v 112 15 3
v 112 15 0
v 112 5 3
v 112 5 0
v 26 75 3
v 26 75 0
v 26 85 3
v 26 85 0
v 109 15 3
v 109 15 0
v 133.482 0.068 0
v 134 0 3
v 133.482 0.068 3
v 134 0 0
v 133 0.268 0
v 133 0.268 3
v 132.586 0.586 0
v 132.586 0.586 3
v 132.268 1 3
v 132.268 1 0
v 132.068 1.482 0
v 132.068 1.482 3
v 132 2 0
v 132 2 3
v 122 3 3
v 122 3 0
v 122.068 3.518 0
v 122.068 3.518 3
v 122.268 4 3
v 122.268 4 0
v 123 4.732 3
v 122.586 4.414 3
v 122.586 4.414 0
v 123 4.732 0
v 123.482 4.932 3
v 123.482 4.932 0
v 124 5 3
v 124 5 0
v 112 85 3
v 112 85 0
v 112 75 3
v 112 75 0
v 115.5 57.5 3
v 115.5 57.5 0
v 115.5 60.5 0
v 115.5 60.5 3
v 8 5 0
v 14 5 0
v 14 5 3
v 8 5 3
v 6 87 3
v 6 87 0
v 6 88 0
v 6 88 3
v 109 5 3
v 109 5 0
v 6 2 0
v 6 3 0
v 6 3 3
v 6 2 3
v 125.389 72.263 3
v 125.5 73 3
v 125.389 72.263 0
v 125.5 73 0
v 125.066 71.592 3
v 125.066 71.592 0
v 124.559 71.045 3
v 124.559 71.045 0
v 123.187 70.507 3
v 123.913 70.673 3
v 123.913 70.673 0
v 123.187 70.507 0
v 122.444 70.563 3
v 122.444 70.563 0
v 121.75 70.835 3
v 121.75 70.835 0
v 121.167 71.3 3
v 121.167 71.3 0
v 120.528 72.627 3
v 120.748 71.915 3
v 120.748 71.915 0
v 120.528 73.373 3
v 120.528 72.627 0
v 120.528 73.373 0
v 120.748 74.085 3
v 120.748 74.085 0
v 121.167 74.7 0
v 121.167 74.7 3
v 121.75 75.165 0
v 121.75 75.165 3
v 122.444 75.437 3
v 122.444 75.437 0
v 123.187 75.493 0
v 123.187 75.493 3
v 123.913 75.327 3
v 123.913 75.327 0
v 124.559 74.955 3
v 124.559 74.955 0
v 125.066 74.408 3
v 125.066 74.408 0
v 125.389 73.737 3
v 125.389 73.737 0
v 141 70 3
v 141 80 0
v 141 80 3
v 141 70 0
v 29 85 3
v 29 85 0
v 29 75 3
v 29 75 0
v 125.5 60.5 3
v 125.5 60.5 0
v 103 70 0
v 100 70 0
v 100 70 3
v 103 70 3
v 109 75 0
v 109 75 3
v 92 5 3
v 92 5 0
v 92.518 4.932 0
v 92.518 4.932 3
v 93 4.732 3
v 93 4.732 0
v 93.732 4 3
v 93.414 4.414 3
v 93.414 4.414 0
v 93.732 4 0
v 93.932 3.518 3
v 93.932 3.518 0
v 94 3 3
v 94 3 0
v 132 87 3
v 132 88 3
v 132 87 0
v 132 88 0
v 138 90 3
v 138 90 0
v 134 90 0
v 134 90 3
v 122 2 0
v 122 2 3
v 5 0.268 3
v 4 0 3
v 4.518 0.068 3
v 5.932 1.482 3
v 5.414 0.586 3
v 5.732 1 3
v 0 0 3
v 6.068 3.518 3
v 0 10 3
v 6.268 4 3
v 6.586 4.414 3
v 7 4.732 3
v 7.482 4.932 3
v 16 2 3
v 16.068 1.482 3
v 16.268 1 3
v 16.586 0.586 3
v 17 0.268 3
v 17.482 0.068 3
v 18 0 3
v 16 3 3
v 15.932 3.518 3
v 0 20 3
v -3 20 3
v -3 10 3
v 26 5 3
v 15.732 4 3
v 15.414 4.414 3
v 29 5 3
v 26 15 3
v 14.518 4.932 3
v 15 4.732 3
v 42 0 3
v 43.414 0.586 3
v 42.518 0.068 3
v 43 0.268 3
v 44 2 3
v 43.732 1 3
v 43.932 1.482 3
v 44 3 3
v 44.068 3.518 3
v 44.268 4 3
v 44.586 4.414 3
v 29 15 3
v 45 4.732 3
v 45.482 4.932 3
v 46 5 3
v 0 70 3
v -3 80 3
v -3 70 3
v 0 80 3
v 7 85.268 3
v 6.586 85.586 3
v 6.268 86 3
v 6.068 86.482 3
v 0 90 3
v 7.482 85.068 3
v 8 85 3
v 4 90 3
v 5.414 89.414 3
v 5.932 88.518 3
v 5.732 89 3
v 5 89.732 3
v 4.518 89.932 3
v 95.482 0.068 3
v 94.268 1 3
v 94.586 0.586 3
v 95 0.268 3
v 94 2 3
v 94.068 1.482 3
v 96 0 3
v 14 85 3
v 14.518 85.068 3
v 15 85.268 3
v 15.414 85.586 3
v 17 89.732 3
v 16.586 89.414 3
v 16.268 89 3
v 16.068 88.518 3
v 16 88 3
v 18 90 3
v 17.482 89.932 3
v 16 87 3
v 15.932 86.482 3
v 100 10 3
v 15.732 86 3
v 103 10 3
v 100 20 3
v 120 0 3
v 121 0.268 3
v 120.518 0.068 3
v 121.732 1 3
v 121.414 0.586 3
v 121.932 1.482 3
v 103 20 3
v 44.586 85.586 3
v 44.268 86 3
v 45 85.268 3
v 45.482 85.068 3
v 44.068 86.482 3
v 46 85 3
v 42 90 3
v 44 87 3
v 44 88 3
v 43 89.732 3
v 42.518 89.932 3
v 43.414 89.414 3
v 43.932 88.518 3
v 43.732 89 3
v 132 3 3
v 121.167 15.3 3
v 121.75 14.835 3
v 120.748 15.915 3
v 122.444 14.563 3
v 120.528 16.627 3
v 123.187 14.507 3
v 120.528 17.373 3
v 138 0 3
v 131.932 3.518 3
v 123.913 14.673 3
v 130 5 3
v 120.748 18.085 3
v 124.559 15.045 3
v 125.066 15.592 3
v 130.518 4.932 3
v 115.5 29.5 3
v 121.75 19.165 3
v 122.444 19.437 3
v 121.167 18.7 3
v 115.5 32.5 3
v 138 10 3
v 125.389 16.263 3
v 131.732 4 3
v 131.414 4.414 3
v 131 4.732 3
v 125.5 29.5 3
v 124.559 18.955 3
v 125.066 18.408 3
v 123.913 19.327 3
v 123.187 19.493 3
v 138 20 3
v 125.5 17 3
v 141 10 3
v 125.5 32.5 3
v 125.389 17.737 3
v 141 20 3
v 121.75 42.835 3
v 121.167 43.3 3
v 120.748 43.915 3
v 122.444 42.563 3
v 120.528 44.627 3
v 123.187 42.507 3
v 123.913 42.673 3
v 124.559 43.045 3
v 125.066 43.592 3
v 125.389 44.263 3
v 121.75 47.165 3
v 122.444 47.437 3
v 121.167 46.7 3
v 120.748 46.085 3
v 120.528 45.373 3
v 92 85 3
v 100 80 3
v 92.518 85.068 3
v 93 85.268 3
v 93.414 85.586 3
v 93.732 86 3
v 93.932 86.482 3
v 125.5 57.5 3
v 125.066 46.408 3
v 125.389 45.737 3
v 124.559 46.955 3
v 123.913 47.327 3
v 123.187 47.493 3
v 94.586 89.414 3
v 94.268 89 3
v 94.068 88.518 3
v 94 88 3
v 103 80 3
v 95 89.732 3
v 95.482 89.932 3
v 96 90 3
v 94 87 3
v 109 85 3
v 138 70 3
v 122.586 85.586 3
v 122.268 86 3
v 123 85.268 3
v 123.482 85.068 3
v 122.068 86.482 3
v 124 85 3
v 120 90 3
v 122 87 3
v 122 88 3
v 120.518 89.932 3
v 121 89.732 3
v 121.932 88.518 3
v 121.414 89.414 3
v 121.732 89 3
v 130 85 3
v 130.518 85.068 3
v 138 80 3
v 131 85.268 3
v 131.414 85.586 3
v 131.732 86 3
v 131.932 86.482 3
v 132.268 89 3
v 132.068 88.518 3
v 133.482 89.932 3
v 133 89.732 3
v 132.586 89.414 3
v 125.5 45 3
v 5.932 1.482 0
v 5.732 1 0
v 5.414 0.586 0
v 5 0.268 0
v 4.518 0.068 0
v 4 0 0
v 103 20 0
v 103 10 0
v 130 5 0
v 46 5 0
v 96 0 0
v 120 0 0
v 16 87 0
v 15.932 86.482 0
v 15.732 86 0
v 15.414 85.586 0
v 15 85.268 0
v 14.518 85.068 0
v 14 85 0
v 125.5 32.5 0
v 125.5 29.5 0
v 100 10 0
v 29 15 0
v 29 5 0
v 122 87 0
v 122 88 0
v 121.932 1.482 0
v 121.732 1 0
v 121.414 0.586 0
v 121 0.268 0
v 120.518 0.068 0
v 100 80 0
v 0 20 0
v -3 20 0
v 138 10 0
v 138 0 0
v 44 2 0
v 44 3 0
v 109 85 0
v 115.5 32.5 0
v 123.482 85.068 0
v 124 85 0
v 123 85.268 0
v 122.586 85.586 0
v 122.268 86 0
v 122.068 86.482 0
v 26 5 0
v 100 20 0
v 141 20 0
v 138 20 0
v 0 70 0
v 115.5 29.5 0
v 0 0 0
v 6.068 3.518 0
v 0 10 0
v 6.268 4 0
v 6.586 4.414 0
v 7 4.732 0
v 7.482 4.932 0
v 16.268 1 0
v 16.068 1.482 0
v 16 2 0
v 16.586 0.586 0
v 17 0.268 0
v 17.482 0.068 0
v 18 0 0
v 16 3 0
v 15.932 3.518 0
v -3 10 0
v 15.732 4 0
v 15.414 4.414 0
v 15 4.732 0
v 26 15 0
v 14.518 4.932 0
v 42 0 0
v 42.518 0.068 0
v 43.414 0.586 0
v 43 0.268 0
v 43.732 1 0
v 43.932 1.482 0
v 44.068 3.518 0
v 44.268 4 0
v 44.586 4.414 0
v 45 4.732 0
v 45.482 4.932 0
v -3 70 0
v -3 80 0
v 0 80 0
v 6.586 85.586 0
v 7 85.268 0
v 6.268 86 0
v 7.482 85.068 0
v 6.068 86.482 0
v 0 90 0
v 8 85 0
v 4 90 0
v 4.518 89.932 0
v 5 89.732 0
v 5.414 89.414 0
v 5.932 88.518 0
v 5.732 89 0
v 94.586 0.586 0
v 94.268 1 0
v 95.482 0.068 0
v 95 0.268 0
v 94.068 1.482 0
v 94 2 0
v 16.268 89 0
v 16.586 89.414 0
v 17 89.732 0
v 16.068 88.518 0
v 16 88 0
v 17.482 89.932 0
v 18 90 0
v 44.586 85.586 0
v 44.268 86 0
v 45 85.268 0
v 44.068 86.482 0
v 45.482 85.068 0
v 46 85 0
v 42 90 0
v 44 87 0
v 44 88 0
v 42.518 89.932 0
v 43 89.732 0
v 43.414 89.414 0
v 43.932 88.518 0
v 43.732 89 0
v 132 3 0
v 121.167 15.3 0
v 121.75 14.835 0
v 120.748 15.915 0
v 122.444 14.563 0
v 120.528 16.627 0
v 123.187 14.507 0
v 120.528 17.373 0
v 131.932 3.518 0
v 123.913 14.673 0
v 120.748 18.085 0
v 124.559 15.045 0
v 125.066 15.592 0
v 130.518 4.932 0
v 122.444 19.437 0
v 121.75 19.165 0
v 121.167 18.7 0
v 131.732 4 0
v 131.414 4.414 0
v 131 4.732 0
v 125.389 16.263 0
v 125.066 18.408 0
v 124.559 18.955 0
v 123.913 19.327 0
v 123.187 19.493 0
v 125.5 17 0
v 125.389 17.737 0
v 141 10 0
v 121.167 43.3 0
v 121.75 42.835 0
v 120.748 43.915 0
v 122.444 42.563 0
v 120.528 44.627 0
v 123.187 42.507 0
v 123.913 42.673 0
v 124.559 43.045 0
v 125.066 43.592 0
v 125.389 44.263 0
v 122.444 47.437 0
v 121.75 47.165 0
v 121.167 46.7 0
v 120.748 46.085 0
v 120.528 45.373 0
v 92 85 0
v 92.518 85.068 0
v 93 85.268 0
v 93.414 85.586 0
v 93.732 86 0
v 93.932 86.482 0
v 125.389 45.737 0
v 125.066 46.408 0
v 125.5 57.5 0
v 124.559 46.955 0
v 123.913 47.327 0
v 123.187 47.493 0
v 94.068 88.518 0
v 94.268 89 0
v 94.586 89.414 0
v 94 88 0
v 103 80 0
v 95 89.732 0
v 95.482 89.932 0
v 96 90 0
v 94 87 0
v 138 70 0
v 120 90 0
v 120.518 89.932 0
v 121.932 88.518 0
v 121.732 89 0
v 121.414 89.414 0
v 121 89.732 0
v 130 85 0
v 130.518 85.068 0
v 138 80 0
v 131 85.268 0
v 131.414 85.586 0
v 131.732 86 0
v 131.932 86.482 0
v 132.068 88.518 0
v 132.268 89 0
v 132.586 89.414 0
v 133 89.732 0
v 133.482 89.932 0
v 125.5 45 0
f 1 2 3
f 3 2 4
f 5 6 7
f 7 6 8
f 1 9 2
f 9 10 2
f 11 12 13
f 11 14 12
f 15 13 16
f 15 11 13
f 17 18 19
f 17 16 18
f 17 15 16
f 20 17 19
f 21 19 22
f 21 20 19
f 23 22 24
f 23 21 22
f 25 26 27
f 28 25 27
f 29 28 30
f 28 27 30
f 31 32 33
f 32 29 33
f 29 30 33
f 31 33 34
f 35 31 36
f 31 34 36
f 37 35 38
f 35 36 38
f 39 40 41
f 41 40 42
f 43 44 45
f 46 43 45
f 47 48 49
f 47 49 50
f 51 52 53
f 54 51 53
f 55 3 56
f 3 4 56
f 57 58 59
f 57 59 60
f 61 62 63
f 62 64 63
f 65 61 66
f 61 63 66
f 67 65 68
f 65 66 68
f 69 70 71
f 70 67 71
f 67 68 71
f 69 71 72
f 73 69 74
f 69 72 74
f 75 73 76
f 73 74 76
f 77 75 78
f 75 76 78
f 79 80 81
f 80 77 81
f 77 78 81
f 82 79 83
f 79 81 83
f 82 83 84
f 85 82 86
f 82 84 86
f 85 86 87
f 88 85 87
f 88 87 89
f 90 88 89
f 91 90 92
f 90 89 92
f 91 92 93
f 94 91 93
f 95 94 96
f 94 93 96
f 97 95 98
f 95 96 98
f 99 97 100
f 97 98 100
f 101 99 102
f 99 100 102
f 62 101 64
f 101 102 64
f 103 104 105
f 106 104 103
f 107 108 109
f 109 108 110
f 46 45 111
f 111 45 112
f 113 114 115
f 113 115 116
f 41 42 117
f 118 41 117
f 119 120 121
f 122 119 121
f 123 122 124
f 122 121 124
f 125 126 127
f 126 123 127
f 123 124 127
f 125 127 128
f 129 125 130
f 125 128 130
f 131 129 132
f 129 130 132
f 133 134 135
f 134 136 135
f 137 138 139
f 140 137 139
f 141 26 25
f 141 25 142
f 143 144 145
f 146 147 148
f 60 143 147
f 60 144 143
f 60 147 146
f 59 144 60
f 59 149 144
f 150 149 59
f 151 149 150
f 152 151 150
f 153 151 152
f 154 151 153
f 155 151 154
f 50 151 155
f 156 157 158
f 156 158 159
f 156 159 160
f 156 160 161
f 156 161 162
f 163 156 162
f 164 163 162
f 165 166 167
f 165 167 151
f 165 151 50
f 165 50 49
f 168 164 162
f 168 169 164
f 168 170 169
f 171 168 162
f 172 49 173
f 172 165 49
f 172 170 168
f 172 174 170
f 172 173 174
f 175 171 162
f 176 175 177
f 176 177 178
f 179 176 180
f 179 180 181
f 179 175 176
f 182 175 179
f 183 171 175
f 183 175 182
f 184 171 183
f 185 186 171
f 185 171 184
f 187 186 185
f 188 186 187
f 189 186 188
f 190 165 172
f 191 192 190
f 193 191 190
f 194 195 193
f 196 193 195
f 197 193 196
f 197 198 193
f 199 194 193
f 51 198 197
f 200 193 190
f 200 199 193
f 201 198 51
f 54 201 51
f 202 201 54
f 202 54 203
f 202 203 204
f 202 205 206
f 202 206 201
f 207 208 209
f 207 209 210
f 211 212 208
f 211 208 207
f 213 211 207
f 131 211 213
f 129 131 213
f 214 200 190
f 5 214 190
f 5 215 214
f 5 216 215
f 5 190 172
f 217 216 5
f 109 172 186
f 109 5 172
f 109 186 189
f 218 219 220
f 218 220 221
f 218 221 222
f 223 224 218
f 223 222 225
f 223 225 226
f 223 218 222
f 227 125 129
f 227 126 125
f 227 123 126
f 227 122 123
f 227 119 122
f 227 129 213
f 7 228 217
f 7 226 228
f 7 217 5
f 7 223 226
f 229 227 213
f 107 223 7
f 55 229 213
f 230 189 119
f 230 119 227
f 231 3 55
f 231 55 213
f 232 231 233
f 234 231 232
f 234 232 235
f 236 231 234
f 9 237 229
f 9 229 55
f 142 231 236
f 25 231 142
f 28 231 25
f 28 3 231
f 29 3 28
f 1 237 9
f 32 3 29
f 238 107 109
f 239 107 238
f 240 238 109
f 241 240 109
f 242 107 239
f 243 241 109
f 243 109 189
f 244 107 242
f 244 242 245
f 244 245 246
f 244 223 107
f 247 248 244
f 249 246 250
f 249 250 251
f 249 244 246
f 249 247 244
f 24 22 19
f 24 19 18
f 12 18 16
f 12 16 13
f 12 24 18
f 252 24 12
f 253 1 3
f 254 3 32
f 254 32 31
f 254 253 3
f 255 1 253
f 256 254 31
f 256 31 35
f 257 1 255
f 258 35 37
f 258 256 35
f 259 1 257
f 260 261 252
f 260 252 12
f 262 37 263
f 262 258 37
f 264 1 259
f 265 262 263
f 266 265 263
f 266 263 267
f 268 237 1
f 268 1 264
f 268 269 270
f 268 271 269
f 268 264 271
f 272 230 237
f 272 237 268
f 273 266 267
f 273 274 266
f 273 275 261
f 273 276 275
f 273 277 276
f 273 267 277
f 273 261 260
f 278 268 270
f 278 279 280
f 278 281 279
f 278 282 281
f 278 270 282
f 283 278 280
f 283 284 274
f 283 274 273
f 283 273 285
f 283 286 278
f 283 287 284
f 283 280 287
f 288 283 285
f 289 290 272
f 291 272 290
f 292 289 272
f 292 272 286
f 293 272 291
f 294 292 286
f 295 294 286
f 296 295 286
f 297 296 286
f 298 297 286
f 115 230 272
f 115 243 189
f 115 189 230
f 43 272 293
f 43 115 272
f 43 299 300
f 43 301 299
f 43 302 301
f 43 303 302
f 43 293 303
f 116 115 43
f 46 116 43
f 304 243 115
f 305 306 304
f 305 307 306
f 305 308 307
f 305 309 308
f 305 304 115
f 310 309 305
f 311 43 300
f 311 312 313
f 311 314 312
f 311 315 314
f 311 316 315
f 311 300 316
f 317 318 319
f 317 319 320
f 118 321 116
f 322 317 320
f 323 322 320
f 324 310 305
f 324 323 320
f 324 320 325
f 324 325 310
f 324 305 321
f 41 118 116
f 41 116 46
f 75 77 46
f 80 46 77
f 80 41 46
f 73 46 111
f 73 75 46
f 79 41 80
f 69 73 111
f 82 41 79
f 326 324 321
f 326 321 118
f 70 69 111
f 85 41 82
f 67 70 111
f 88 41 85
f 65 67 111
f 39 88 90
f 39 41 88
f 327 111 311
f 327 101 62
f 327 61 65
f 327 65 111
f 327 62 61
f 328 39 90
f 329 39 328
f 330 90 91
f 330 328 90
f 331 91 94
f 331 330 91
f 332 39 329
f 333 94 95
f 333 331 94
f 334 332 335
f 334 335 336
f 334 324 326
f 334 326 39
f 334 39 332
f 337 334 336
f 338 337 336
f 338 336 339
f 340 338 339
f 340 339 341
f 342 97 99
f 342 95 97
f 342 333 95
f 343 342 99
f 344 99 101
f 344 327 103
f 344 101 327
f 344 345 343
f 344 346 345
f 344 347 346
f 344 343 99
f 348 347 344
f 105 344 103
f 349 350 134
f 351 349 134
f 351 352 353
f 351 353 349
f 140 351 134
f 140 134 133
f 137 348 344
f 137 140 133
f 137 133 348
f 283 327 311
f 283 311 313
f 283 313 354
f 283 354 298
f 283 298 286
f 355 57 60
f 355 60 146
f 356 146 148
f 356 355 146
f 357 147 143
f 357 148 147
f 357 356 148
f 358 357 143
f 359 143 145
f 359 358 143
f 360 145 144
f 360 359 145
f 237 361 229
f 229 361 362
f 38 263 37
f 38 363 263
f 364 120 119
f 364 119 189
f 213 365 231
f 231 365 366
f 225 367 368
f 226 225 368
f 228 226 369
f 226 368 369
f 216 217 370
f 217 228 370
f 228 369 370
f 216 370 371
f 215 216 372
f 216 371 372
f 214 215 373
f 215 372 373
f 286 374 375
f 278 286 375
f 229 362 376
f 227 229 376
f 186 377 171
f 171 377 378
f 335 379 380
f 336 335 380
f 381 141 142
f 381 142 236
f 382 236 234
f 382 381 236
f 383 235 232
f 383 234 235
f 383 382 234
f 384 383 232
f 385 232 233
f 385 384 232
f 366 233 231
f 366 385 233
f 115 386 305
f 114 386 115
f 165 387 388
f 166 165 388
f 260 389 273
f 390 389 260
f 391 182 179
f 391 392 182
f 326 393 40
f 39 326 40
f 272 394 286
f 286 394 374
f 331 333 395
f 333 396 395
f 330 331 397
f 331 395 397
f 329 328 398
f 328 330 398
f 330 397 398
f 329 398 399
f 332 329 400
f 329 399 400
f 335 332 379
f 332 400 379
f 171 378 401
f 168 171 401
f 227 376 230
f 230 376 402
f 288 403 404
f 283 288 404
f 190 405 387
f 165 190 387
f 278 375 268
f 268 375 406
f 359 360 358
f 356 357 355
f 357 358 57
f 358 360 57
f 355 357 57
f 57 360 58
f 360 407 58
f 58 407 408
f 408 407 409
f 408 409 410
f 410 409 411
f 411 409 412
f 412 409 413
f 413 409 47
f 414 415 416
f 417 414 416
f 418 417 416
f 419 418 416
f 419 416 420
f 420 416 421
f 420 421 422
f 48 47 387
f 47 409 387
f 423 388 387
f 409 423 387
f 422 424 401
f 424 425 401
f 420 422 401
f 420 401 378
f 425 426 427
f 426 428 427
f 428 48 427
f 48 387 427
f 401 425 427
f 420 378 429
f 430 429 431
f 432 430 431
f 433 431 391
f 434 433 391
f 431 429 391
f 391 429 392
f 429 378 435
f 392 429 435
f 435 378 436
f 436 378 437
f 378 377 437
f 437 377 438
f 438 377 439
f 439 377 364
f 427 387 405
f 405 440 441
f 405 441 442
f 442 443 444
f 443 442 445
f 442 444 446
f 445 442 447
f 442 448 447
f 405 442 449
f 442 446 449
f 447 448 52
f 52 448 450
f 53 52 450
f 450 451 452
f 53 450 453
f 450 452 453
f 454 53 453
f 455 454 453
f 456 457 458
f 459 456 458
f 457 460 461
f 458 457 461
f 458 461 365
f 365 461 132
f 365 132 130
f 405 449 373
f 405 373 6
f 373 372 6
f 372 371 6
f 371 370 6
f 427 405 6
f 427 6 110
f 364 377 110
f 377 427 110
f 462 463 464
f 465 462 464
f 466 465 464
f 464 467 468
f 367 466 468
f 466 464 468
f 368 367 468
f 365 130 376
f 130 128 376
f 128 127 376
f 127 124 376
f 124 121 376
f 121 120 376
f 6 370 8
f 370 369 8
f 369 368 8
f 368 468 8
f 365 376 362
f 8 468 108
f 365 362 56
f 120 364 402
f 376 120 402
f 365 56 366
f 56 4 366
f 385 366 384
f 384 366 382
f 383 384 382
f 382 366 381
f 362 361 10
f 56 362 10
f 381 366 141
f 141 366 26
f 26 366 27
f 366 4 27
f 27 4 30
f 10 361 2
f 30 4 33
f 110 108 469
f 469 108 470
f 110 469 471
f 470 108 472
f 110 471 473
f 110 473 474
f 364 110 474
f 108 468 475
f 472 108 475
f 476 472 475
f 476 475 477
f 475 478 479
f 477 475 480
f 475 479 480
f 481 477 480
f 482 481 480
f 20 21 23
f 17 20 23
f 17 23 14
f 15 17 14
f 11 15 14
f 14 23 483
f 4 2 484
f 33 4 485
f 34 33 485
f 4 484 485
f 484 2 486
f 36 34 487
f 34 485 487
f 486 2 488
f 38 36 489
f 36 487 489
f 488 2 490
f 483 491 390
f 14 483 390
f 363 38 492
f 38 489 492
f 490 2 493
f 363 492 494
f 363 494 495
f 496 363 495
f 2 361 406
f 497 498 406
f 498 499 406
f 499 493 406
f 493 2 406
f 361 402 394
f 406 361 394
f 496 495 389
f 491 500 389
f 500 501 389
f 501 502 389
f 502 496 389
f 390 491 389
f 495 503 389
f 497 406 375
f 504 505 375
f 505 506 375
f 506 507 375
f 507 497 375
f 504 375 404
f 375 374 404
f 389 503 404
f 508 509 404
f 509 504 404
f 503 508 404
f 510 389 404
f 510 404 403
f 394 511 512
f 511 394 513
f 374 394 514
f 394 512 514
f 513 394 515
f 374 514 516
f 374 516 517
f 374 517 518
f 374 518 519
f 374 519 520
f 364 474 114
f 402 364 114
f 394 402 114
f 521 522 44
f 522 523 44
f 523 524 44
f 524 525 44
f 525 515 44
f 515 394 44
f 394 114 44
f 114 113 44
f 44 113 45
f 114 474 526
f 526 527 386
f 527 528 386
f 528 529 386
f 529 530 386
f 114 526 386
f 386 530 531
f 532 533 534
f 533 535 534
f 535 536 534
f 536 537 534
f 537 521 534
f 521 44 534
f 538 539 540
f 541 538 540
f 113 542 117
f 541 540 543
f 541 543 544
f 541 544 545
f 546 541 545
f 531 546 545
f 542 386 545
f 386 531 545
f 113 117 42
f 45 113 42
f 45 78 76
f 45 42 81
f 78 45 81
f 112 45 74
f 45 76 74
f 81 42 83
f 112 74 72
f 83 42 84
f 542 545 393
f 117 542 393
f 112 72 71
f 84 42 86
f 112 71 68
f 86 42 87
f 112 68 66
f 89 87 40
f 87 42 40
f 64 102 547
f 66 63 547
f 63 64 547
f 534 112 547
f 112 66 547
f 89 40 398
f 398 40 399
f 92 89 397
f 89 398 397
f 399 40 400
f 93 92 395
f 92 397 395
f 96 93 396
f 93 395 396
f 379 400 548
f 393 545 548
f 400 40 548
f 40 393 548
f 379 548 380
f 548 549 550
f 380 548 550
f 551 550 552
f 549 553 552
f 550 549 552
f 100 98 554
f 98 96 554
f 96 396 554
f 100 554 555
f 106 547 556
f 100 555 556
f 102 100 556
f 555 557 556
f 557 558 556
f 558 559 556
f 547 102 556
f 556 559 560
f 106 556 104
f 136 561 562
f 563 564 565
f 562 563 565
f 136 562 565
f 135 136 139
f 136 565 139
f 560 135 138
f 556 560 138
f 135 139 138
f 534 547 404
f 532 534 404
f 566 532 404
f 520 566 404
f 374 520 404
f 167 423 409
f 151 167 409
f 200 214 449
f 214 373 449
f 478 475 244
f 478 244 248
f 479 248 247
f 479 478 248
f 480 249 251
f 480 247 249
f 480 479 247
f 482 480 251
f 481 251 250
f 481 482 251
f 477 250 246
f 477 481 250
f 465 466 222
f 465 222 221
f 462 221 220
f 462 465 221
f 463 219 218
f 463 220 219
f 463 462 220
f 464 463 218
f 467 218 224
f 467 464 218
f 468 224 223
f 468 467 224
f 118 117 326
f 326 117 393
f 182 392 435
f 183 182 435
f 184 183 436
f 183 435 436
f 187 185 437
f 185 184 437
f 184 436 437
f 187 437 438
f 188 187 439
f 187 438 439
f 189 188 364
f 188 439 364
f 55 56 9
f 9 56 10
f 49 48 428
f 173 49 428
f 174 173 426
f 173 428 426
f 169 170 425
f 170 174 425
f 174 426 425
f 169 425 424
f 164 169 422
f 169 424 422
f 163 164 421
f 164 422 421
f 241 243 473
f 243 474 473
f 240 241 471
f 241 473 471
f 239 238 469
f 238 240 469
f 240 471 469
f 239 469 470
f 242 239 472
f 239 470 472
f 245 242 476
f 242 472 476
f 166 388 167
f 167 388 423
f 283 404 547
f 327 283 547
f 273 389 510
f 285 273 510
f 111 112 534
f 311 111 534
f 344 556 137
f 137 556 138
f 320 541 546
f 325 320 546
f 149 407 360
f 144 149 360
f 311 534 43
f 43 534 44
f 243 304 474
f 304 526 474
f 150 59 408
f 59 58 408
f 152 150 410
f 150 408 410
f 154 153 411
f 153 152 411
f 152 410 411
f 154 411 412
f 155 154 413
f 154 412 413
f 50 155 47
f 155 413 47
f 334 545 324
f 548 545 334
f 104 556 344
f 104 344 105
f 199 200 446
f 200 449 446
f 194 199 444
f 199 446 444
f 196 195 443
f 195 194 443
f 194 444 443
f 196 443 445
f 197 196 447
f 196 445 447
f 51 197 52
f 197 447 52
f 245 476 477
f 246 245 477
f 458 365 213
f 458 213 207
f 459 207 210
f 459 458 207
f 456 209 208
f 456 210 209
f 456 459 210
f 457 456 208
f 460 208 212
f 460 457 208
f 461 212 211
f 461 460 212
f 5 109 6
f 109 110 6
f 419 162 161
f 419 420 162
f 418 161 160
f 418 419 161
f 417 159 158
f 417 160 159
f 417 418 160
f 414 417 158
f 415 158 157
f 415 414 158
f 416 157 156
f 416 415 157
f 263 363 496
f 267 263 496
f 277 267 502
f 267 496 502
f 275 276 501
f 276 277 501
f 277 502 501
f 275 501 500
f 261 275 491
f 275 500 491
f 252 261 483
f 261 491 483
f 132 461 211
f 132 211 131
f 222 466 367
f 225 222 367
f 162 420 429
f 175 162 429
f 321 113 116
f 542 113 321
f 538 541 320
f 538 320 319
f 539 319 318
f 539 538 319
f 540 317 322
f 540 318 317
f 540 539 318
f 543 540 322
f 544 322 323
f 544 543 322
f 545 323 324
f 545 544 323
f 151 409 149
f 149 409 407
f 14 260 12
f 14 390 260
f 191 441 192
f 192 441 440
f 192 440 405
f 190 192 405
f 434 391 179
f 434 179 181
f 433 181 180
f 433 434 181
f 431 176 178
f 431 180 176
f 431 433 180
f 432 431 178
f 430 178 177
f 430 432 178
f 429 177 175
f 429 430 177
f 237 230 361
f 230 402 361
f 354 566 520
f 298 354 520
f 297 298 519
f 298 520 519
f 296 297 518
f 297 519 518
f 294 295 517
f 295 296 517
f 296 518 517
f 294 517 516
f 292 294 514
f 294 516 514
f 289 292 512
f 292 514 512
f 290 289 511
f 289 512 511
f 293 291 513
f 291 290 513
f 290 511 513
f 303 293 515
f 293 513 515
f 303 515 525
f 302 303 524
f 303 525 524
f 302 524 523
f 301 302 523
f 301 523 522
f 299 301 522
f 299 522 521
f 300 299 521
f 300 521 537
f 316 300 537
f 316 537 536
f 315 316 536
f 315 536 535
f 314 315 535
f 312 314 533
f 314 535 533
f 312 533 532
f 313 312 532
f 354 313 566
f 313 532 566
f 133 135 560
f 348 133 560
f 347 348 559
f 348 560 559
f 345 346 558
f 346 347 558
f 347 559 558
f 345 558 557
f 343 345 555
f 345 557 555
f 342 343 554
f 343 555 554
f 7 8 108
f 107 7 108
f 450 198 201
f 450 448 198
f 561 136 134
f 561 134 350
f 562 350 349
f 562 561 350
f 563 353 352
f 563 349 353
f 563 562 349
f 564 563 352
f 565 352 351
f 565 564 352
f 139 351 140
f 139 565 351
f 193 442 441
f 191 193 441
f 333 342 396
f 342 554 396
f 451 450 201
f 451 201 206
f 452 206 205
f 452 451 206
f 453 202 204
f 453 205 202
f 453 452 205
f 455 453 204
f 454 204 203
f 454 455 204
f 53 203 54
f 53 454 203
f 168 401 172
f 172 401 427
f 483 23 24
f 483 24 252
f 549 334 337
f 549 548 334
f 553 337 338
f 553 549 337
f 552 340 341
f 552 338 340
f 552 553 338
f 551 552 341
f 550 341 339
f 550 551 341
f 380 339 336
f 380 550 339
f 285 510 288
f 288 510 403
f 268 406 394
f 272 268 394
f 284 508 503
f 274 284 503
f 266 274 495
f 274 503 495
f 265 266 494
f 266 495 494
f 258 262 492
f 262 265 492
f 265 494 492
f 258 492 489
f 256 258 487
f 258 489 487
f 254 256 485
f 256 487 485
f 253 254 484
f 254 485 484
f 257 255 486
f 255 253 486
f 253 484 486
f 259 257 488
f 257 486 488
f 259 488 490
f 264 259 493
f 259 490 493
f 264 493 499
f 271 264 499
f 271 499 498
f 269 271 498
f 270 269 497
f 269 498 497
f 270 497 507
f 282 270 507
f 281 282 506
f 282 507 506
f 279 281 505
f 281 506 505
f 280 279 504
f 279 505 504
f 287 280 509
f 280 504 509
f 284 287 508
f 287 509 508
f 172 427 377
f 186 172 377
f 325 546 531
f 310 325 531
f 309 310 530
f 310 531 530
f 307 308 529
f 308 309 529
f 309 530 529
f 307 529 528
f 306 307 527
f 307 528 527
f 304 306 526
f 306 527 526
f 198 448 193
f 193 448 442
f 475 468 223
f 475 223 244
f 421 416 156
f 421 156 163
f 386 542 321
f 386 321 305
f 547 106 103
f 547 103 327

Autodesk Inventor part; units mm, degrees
ref_plane "YZ Plane" through (0, 0, 0) normal (1, 0, 0) x (0, 1, 0)
ref_plane "XZ Plane" through (0, 0, 0) normal (0, 1, 0) x (-1, 0, 0)
ref_plane "XY Plane" through (0, 0, 0) normal (0, 0, 1) x (1, 0, 0)
sketch "Sketch1" plane through (0, 0, 0) normal (0, 0, 1) x (1, 0, 0)
  line L0 (138, 80) -> (141, 80)
  line L1 (141, 80) -> (141, 70)
  line L2 (141, 70) -> (138, 70)
  line L3 (138, 10) -> (141, 10)
  line L4 (141, 10) -> (141, 20)
  line L5 (141, 20) -> (138, 20)
  line L6 (138, 80) -> (138, 90)
  line L7 (138, 20) -> (138, 70)
  line L8 (0, 80) -> (-3, 80)
  line L9 (-3, 80) -> (-3, 70)
  line L10 (-3, 70) -> (0, 70)
  line L11 (0, 20) -> (-3, 20)
  line L12 (-3, 20) -> (-3, 10)
  line L13 (-3, 10) -> (0, 10)
  line L14 (0, 90) -> (0, 80)
  line L15 (0, 70) -> (0, 20)
  line L16 (0, 10) -> (0, 0)
  line L17 (26, 85) -> (29, 85)
  line L18 (29, 85) -> (29, 75)
  line L19 (29, 75) -> (26, 75)
  line L20 (26, 75) -> (26, 85)
  line L21 (26, 15) -> (29, 15)
  line L22 (29, 15) -> (29, 5)
  line L23 (29, 5) -> (26, 5)
  line L24 (26, 5) -> (26, 15)
  line L25 (109, 85) -> (112, 85)
  line L26 (112, 85) -> (112, 75)
  line L27 (112, 75) -> (109, 75)
  line L28 (109, 75) -> (109, 85)
  line L29 (109, 15) -> (112, 15)
  line L30 (112, 15) -> (112, 5)
  line L31 (112, 5) -> (109, 5)
  line L32 (109, 5) -> (109, 15)
  line L33 (16, 88) -> (16, 87)
  line L34 (14, 85) -> (8, 85)
  line L35 (6, 87) -> (6, 88)
  line L36 (94, 88) -> (94, 87)
  line L37 (92, 85) -> (46, 85)
  line L38 (44, 87) -> (44, 88)
  line L39 (132, 88) -> (132, 87)
  line L40 (130, 85) -> (124, 85)
  line L41 (122, 87) -> (122, 88)
  line L42 (138, 90) -> (134, 90)
  line L43 (0, 90) -> (4, 90)
  line L44 (18, 90) -> (42, 90)
  line L45 (96, 90) -> (120, 90)
  line L46 (16, 2) -> (16, 3)
  line L47 (14, 5) -> (8, 5)
  line L48 (6, 3) -> (6, 2)
  line L49 (94, 2) -> (94, 3)
  line L50 (92, 5) -> (46, 5)
  line L51 (44, 3) -> (44, 2)
  line L52 (132, 2) -> (132, 3)
  line L53 (130, 5) -> (124, 5)
  line L54 (122, 3) -> (122, 2)
  line L55 (96, 0) -> (120, 0)
  line L56 (0, 0) -> (4, 0)
  line L57 (18, 0) -> (42, 0)
  arc A0 (4, 0) -> (6, 2) centre (4, 2) ccw
  arc A1 (8, 5) -> (6, 3) centre (8, 3) ccw
  arc A2 (16, 3) -> (14, 5) centre (14, 3) ccw
  arc A3 (16, 2) -> (18, 0) centre (18, 2) ccw
  arc A4 (42, 0) -> (44, 2) centre (42, 2) ccw
  arc A5 (46, 5) -> (44, 3) centre (46, 3) ccw
  arc A6 (94, 3) -> (92, 5) centre (92, 3) ccw
  arc A7 (94, 2) -> (96, 0) centre (96, 2) ccw
  arc A8 (120, 0) -> (122, 2) centre (120, 2) ccw
  arc A9 (124, 5) -> (122, 3) centre (124, 3) ccw
  arc A10 (132, 3) -> (130, 5) centre (130, 3) ccw
  arc A11 (132, 2) -> (134, 0) centre (134, 2) ccw
  arc A12 (6, 88) -> (4, 90) centre (4, 88) ccw
  arc A13 (6, 87) -> (8, 85) centre (8, 87) ccw
  arc A14 (14, 85) -> (16, 87) centre (14, 87) ccw
  arc A15 (18, 90) -> (16, 88) centre (18, 88) ccw
  arc A16 (44, 88) -> (42, 90) centre (42, 88) ccw
  arc A17 (44, 87) -> (46, 85) centre (46, 87) ccw
  arc A18 (92, 85) -> (94, 87) centre (92, 87) ccw
  arc A19 (96, 90) -> (94, 88) centre (96, 88) ccw
  arc A20 (122, 88) -> (120, 90) centre (120, 88) ccw
  arc A21 (122, 87) -> (124, 85) centre (124, 87) ccw
  arc A22 (130, 85) -> (132, 87) centre (130, 87) ccw
  arc A23 (134, 90) -> (132, 88) centre (134, 88) ccw
  line L58 (138, 10) -> (138, 0)
  line L59 (138, 0) -> (134, 0)
  line L60 (103, 10) -> (100, 10)
  line L61 (100, 10) -> (100, 20)
  line L62 (100, 20) -> (103, 20)
  line L63 (103, 20) -> (103, 10)
  line L64 (103, 80) -> (100, 80)
  line L65 (100, 80) -> (100, 70)
  line L66 (100, 70) -> (103, 70)
  line L67 (103, 70) -> (103, 80)
  line L68 (115.5, 60.5) -> (125.5, 60.5)
  line L69 (125.5, 60.5) -> (125.5, 57.5)
  line L70 (125.5, 57.5) -> (115.5, 57.5)
  line L71 (115.5, 57.5) -> (115.5, 60.5)
  line L72 (115.5, 32.5) -> (125.5, 32.5)
  line L73 (125.5, 32.5) -> (125.5, 29.5)
  line L74 (125.5, 29.5) -> (115.5, 29.5)
  line L75 (115.5, 29.5) -> (115.5, 32.5)
  circle A24 centre (123, 45) radius 2.5
  circle A25 centre (123, 73) radius 2.5
  circle A26 centre (123, 17) radius 2.5
  point P0 (16, 85)
  point P1 (6, 85)
  point P2 (94, 85)
  point P3 (44, 85)
  point P4 (132, 85)
  point P5 (122, 85)
  point P6 (16, 5)
  point P7 (6, 5)
  point P8 (94, 5)
  point P9 (44, 5)
  point P10 (132, 5)
  point P11 (122, 5)
  dimension "d1" = 90
  dimension "d3" = 10
  dimension "d4" = 50
  dimension "d5" = 10
  dimension "d10" = 3
  dimension "d11" = 3
  dimension "d13" = 3
  dimension "d14" = 3
  dimension "d16" = 10
  dimension "d17" = 10
  dimension "d20" = 138
  dimension "d21" = 50
  dimension "d22" = 3
  dimension "d23" = 3
  dimension "d24" = 3
  dimension "d27" = 26
  dimension "d28" = 3
  dimension "d30" = 3
  dimension "d31" = 26
  dimension "d33" = 10
  dimension "d34" = 10
  dimension "d35" = 26
  dimension "d36" = 3
  dimension "d38" = 10
  dimension "d39" = 3
  dimension "d40" = 10
  dimension "d45" = 10
  dimension "d46" = 50
  dimension "d47" = 10
  dimension "d48" = 6
  dimension "d49" = 6
  dimension "d54" = 10
  dimension "d55" = 50
  dimension "d56" = 10
  dimension "d57" = 2
  dimension "d58" = 26
  dimension "d59" = 6
  dimension "d60" = 6
  dimension "d62" = 28
  dimension "d63" = 3
  dimension "d64" = 28
  dimension "d65" = 28
  dimension "d66" = 28
  dimension "d67" = 5
  dimension "d68" = 5
  dimension "d69" = 5
  dimension "d70" = 5
  dimension "d71" = 5
  dimension "d72" = 5
  dimension "d73" = 5
  dimension "d74" = 5
  dimension "d75" = 5
  dimension "d76" = 5
  dimension "d77" = 5
  dimension "d78" = 5
  dimension "d79" = 3
  dimension "d80" = 10
  dimension "d81" = 35
  dimension "d82" = 10
  dimension "d83" = 3
  dimension "d84" = 10
  dimension "d85" = 10
  dimension "d86" = 35
  dimension "d89" = 10
extrude "Extrusion5" add sketch "Sketch1" along normal blind 3
properties part number "OpenROV 2.3 Dev EChassis Main Plate"
